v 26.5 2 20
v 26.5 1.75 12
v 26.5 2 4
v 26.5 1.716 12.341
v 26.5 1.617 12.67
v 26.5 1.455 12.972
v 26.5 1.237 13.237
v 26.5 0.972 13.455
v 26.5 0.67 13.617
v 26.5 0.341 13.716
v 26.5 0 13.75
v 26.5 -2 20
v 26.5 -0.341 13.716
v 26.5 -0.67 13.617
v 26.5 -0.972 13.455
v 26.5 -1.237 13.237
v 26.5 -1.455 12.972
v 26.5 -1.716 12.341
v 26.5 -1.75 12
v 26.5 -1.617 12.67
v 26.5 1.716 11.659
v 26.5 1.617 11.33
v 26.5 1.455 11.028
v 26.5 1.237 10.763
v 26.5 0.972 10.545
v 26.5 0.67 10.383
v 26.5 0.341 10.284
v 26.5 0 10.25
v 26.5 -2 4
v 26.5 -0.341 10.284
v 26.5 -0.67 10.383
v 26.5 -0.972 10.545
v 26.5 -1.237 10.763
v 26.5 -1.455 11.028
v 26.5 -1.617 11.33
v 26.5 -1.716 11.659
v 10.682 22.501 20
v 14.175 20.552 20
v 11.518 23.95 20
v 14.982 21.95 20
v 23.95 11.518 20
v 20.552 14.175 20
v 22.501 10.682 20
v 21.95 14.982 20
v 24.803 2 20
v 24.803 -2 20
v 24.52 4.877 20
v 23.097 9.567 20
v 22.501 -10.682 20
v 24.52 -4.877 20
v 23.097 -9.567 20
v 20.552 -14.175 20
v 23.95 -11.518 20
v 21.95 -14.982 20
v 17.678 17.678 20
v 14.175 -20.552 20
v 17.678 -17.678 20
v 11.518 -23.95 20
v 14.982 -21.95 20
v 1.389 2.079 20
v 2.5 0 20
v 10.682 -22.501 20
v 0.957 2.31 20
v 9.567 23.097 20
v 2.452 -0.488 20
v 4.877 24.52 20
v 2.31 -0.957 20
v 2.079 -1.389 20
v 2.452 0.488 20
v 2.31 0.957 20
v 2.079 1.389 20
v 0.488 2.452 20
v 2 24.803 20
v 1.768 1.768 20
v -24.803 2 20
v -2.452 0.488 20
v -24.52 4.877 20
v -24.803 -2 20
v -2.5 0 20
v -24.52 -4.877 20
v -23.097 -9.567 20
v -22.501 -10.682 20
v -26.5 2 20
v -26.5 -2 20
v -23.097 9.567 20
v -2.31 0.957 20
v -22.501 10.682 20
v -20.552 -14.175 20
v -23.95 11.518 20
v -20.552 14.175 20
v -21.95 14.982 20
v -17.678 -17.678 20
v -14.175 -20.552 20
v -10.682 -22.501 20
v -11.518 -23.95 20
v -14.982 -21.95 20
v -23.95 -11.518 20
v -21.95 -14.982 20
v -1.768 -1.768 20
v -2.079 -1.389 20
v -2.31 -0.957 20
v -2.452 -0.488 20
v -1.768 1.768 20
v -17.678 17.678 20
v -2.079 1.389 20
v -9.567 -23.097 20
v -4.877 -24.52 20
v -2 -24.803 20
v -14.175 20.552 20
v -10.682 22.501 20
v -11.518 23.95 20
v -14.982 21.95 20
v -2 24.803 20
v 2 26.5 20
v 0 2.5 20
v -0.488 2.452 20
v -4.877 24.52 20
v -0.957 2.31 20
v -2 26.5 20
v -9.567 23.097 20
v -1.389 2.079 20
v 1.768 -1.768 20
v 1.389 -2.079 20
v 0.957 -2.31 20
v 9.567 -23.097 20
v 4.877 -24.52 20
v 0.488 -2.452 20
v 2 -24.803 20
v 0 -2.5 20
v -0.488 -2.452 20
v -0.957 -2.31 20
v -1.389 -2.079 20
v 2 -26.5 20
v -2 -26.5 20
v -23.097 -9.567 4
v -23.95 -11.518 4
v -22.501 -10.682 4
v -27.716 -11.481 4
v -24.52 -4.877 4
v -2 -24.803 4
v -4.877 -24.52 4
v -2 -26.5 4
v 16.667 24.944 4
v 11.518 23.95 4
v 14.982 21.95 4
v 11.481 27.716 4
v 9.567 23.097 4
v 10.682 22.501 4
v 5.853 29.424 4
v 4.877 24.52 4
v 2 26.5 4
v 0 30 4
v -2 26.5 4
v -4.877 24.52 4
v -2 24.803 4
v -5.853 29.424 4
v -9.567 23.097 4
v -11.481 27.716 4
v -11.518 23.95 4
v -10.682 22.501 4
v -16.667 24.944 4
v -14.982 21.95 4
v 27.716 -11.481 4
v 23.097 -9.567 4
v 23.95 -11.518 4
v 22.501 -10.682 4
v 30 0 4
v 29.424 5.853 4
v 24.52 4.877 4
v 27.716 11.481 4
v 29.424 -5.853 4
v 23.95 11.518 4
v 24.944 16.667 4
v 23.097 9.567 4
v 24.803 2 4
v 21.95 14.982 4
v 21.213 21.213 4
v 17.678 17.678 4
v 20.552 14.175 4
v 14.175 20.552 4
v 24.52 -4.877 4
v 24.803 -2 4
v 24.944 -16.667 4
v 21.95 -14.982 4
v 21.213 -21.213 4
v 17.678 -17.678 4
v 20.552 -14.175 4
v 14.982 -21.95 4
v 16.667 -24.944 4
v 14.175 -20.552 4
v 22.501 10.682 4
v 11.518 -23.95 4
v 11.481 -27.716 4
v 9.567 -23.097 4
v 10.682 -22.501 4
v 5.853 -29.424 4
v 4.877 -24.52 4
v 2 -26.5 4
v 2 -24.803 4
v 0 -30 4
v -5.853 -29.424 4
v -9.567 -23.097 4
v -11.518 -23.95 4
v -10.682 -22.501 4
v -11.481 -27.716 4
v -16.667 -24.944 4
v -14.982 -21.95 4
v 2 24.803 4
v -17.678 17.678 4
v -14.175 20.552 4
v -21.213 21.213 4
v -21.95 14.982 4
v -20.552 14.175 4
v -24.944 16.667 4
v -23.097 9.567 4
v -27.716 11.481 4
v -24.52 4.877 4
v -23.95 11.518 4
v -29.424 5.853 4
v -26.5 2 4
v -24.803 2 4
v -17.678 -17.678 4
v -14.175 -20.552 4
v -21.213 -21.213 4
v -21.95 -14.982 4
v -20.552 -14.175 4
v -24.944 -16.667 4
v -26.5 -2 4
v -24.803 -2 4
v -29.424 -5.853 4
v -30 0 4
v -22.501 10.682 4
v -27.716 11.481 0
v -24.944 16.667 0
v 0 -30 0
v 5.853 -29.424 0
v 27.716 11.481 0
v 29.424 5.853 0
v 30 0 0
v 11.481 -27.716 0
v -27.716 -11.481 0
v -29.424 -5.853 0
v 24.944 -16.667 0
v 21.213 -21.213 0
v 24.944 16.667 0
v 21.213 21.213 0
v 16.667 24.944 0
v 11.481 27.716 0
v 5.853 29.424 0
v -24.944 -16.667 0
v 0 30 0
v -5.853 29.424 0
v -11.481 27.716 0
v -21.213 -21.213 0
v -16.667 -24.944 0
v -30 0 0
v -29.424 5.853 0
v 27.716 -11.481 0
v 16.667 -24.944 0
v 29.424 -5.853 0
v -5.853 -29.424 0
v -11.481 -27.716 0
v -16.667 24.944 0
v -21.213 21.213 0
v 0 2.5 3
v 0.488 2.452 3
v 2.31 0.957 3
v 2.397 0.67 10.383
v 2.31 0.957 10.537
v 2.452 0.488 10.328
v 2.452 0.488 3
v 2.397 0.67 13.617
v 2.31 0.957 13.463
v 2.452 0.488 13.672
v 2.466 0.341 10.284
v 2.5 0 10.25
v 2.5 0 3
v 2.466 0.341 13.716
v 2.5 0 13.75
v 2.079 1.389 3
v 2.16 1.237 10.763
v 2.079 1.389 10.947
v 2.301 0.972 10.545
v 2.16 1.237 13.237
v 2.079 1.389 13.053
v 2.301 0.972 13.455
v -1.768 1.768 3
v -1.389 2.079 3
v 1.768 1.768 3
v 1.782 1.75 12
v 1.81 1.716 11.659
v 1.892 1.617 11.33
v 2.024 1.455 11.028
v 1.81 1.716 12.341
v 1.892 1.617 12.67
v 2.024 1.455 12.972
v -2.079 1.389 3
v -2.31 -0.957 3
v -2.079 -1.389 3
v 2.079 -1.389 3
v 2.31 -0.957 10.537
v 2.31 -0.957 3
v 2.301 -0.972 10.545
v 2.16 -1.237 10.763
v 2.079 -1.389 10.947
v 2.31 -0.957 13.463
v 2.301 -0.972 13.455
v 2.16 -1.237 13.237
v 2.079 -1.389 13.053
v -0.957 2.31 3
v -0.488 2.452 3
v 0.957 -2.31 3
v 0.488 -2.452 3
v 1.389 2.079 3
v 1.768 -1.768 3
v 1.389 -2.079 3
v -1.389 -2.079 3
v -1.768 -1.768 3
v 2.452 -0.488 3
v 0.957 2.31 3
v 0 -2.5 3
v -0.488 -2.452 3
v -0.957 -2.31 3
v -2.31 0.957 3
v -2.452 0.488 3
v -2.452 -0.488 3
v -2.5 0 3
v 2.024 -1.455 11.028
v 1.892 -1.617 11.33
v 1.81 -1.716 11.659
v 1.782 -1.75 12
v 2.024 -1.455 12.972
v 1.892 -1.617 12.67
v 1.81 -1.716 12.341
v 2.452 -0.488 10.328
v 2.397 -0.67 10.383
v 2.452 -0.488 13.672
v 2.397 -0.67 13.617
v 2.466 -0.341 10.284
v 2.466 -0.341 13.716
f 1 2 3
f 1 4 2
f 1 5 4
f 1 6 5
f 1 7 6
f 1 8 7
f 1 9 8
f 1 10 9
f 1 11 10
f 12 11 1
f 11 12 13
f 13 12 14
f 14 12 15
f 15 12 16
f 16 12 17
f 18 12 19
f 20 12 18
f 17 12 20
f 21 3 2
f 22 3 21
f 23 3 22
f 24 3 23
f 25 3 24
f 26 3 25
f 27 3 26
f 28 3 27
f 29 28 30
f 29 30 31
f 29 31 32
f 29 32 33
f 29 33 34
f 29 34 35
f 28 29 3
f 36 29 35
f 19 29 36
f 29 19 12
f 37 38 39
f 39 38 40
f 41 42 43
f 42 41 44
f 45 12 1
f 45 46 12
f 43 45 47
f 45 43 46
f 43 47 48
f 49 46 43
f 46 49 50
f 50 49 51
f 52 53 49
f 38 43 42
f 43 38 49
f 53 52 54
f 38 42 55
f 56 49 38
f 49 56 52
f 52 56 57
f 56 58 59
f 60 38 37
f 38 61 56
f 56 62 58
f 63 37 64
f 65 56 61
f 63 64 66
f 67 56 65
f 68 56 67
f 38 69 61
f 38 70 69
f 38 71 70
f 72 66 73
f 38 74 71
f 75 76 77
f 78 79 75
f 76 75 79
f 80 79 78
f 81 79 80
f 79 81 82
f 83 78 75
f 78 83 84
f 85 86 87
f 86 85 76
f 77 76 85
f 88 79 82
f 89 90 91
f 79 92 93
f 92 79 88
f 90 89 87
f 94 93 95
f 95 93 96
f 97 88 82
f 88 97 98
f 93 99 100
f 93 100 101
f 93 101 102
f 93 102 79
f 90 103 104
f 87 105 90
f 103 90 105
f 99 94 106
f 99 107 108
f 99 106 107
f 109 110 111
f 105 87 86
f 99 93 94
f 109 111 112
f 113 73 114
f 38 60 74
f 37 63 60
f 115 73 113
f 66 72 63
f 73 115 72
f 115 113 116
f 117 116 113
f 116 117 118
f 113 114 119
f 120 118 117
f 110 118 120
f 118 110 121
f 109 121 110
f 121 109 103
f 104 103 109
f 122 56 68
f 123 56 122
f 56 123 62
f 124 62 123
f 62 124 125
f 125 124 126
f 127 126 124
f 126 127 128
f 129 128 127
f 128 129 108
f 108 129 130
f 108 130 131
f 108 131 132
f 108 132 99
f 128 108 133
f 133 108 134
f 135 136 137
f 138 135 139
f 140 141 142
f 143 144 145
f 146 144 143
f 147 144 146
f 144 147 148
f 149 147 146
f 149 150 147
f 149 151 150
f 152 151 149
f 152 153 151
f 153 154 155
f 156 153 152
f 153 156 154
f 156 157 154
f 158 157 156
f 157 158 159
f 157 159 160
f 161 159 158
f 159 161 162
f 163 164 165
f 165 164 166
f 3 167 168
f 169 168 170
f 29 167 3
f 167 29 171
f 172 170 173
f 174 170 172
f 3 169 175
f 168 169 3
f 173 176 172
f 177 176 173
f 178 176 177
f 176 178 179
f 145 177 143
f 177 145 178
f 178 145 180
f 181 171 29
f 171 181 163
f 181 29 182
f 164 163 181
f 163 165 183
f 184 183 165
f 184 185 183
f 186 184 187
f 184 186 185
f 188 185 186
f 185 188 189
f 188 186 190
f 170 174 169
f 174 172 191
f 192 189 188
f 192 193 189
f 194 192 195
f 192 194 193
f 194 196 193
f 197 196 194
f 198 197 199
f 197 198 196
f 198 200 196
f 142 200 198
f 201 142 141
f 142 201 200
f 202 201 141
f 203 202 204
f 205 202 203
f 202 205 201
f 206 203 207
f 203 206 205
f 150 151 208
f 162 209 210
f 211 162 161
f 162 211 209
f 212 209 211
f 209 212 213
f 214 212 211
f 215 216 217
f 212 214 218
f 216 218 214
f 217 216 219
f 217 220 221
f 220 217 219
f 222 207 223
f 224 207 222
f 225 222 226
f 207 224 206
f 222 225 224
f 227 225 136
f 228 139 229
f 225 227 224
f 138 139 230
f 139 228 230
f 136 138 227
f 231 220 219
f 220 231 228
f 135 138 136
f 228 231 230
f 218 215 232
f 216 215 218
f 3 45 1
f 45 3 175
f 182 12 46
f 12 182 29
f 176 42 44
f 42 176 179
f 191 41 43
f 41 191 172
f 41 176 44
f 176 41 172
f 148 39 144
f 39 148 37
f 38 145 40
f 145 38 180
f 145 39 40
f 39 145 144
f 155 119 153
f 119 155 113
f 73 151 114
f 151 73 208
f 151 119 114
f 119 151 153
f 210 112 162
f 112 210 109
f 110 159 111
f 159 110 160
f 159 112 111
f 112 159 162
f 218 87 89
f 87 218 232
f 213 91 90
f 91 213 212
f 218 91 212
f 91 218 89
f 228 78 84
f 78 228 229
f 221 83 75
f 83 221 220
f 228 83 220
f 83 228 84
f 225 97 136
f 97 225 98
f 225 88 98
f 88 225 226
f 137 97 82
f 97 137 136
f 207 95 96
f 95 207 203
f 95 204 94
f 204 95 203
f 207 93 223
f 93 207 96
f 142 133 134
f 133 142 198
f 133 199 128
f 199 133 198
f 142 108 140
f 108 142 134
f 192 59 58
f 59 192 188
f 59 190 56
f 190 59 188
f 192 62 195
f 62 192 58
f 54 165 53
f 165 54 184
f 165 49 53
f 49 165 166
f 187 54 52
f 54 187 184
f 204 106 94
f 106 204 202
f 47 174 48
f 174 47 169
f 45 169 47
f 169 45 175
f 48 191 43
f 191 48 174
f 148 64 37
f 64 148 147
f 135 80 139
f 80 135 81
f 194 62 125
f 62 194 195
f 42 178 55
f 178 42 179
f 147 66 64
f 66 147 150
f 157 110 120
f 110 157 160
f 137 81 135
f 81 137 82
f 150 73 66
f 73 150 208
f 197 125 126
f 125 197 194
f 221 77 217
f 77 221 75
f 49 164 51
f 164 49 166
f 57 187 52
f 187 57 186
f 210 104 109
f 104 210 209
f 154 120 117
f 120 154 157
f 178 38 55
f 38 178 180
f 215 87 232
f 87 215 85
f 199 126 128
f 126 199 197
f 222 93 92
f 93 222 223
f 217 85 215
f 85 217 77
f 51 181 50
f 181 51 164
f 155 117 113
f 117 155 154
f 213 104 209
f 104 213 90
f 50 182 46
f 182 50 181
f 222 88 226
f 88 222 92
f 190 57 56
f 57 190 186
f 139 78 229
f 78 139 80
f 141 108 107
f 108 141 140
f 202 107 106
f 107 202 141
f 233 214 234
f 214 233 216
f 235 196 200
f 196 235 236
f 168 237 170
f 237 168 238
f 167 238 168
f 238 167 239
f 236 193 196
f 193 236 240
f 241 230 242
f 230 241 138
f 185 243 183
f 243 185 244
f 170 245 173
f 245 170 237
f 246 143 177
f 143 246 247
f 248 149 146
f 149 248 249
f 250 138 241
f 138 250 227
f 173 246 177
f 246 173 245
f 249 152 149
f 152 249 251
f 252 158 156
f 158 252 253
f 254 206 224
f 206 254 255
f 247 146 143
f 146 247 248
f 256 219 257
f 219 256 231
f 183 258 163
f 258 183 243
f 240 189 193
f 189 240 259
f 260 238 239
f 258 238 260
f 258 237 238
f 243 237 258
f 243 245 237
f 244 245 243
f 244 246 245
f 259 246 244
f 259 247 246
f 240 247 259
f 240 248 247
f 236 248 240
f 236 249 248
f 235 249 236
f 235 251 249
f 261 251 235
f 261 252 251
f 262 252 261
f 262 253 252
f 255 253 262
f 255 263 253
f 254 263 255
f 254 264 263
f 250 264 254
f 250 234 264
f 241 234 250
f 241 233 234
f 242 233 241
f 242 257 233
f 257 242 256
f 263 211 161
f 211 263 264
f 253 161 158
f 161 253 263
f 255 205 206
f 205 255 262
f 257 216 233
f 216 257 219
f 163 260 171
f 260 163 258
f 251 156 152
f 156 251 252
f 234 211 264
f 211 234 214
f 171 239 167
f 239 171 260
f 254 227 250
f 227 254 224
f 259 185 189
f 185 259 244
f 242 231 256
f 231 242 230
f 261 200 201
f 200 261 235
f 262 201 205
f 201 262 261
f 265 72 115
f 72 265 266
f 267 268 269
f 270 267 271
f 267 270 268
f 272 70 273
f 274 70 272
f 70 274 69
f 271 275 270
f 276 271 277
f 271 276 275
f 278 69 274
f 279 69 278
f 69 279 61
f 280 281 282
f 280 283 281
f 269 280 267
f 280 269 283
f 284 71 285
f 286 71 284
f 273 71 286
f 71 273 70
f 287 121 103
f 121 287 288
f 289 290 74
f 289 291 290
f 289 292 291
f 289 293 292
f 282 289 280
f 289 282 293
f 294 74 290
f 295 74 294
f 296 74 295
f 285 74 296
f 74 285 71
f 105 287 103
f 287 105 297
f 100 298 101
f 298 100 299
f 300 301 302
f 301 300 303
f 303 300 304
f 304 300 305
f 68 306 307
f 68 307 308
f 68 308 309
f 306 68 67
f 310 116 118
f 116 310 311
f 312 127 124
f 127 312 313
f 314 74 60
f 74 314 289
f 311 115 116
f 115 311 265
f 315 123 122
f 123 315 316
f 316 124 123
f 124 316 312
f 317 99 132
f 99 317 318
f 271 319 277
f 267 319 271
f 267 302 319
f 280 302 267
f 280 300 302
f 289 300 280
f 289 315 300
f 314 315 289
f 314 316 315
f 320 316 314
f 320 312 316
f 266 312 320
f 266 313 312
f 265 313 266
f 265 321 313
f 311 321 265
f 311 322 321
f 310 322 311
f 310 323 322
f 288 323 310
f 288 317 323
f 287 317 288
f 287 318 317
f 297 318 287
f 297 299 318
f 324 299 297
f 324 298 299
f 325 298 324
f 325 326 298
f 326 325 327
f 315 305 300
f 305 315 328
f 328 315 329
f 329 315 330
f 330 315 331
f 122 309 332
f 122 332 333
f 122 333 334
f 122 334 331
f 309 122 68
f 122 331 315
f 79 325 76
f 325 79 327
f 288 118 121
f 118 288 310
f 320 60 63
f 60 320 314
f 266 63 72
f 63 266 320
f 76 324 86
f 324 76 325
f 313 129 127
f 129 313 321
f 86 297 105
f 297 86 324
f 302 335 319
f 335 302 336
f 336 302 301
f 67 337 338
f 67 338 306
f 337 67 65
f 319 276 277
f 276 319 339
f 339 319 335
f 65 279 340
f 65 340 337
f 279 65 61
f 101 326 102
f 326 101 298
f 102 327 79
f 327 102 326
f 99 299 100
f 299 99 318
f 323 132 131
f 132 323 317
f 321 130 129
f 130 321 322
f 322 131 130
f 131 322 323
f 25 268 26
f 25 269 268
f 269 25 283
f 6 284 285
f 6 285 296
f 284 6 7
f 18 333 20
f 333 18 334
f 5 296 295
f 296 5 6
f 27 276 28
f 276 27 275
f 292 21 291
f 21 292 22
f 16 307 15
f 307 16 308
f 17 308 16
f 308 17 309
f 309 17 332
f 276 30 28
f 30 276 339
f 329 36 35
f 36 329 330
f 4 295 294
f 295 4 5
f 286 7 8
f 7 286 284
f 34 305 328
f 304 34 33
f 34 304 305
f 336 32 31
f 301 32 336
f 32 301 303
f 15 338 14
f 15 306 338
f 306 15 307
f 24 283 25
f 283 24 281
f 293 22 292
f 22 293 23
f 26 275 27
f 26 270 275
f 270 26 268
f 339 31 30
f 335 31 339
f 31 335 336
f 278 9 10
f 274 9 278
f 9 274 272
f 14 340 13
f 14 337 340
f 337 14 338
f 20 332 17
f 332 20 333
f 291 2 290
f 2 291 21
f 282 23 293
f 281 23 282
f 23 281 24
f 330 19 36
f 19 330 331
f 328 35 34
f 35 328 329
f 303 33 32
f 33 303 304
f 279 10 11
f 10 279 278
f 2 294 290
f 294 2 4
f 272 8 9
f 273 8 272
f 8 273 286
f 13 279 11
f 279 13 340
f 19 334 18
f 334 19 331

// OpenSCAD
$fn = 32;

// ----------------------------------------------------------------------
// Control knob: skirt knob with grip ribs
// ----------------------------------------------------------------------

// --- parameters (mm) ---
skirt_d = 60;             // skirt diameter
skirt_t = 4;              // skirt thickness
rib_w = 4;                // grip rib width
rib_out = 2.5;            // grip rib radial protrusion
n_ribs = 12;              // number of grip ribs
knob_d = 50;              // knob body diameter
knob_h = 16;              // knob body height
bore_d = 5;               // shaft bore diameter
set_d = 3.5;              // set screw bore diameter

rib_step = 360 / n_ribs;  // rib angular step
total_h = skirt_t + knob_h;  // overall height

difference() {
  union() {
    translate([0, 0, skirt_t]) cylinder(h = knob_h, d = knob_d);
    cylinder(h = skirt_t, d = skirt_d);
    for (i = [0 : n_ribs - 1])
      rotate([0, 0, i * rib_step])
        translate([knob_d / 2 - 1, -rib_w / 2, skirt_t])
          cube([rib_out, rib_w, knob_h]);
  }
  translate([0, 0, skirt_t - 1]) cylinder(h = knob_h + 2, d = bore_d);
  translate([-1, 0, skirt_t + knob_h / 2]) rotate([0, 90, 0])
    cylinder(h = knob_d / 2 + bore_d / 2 + 2, d = set_d);
}
